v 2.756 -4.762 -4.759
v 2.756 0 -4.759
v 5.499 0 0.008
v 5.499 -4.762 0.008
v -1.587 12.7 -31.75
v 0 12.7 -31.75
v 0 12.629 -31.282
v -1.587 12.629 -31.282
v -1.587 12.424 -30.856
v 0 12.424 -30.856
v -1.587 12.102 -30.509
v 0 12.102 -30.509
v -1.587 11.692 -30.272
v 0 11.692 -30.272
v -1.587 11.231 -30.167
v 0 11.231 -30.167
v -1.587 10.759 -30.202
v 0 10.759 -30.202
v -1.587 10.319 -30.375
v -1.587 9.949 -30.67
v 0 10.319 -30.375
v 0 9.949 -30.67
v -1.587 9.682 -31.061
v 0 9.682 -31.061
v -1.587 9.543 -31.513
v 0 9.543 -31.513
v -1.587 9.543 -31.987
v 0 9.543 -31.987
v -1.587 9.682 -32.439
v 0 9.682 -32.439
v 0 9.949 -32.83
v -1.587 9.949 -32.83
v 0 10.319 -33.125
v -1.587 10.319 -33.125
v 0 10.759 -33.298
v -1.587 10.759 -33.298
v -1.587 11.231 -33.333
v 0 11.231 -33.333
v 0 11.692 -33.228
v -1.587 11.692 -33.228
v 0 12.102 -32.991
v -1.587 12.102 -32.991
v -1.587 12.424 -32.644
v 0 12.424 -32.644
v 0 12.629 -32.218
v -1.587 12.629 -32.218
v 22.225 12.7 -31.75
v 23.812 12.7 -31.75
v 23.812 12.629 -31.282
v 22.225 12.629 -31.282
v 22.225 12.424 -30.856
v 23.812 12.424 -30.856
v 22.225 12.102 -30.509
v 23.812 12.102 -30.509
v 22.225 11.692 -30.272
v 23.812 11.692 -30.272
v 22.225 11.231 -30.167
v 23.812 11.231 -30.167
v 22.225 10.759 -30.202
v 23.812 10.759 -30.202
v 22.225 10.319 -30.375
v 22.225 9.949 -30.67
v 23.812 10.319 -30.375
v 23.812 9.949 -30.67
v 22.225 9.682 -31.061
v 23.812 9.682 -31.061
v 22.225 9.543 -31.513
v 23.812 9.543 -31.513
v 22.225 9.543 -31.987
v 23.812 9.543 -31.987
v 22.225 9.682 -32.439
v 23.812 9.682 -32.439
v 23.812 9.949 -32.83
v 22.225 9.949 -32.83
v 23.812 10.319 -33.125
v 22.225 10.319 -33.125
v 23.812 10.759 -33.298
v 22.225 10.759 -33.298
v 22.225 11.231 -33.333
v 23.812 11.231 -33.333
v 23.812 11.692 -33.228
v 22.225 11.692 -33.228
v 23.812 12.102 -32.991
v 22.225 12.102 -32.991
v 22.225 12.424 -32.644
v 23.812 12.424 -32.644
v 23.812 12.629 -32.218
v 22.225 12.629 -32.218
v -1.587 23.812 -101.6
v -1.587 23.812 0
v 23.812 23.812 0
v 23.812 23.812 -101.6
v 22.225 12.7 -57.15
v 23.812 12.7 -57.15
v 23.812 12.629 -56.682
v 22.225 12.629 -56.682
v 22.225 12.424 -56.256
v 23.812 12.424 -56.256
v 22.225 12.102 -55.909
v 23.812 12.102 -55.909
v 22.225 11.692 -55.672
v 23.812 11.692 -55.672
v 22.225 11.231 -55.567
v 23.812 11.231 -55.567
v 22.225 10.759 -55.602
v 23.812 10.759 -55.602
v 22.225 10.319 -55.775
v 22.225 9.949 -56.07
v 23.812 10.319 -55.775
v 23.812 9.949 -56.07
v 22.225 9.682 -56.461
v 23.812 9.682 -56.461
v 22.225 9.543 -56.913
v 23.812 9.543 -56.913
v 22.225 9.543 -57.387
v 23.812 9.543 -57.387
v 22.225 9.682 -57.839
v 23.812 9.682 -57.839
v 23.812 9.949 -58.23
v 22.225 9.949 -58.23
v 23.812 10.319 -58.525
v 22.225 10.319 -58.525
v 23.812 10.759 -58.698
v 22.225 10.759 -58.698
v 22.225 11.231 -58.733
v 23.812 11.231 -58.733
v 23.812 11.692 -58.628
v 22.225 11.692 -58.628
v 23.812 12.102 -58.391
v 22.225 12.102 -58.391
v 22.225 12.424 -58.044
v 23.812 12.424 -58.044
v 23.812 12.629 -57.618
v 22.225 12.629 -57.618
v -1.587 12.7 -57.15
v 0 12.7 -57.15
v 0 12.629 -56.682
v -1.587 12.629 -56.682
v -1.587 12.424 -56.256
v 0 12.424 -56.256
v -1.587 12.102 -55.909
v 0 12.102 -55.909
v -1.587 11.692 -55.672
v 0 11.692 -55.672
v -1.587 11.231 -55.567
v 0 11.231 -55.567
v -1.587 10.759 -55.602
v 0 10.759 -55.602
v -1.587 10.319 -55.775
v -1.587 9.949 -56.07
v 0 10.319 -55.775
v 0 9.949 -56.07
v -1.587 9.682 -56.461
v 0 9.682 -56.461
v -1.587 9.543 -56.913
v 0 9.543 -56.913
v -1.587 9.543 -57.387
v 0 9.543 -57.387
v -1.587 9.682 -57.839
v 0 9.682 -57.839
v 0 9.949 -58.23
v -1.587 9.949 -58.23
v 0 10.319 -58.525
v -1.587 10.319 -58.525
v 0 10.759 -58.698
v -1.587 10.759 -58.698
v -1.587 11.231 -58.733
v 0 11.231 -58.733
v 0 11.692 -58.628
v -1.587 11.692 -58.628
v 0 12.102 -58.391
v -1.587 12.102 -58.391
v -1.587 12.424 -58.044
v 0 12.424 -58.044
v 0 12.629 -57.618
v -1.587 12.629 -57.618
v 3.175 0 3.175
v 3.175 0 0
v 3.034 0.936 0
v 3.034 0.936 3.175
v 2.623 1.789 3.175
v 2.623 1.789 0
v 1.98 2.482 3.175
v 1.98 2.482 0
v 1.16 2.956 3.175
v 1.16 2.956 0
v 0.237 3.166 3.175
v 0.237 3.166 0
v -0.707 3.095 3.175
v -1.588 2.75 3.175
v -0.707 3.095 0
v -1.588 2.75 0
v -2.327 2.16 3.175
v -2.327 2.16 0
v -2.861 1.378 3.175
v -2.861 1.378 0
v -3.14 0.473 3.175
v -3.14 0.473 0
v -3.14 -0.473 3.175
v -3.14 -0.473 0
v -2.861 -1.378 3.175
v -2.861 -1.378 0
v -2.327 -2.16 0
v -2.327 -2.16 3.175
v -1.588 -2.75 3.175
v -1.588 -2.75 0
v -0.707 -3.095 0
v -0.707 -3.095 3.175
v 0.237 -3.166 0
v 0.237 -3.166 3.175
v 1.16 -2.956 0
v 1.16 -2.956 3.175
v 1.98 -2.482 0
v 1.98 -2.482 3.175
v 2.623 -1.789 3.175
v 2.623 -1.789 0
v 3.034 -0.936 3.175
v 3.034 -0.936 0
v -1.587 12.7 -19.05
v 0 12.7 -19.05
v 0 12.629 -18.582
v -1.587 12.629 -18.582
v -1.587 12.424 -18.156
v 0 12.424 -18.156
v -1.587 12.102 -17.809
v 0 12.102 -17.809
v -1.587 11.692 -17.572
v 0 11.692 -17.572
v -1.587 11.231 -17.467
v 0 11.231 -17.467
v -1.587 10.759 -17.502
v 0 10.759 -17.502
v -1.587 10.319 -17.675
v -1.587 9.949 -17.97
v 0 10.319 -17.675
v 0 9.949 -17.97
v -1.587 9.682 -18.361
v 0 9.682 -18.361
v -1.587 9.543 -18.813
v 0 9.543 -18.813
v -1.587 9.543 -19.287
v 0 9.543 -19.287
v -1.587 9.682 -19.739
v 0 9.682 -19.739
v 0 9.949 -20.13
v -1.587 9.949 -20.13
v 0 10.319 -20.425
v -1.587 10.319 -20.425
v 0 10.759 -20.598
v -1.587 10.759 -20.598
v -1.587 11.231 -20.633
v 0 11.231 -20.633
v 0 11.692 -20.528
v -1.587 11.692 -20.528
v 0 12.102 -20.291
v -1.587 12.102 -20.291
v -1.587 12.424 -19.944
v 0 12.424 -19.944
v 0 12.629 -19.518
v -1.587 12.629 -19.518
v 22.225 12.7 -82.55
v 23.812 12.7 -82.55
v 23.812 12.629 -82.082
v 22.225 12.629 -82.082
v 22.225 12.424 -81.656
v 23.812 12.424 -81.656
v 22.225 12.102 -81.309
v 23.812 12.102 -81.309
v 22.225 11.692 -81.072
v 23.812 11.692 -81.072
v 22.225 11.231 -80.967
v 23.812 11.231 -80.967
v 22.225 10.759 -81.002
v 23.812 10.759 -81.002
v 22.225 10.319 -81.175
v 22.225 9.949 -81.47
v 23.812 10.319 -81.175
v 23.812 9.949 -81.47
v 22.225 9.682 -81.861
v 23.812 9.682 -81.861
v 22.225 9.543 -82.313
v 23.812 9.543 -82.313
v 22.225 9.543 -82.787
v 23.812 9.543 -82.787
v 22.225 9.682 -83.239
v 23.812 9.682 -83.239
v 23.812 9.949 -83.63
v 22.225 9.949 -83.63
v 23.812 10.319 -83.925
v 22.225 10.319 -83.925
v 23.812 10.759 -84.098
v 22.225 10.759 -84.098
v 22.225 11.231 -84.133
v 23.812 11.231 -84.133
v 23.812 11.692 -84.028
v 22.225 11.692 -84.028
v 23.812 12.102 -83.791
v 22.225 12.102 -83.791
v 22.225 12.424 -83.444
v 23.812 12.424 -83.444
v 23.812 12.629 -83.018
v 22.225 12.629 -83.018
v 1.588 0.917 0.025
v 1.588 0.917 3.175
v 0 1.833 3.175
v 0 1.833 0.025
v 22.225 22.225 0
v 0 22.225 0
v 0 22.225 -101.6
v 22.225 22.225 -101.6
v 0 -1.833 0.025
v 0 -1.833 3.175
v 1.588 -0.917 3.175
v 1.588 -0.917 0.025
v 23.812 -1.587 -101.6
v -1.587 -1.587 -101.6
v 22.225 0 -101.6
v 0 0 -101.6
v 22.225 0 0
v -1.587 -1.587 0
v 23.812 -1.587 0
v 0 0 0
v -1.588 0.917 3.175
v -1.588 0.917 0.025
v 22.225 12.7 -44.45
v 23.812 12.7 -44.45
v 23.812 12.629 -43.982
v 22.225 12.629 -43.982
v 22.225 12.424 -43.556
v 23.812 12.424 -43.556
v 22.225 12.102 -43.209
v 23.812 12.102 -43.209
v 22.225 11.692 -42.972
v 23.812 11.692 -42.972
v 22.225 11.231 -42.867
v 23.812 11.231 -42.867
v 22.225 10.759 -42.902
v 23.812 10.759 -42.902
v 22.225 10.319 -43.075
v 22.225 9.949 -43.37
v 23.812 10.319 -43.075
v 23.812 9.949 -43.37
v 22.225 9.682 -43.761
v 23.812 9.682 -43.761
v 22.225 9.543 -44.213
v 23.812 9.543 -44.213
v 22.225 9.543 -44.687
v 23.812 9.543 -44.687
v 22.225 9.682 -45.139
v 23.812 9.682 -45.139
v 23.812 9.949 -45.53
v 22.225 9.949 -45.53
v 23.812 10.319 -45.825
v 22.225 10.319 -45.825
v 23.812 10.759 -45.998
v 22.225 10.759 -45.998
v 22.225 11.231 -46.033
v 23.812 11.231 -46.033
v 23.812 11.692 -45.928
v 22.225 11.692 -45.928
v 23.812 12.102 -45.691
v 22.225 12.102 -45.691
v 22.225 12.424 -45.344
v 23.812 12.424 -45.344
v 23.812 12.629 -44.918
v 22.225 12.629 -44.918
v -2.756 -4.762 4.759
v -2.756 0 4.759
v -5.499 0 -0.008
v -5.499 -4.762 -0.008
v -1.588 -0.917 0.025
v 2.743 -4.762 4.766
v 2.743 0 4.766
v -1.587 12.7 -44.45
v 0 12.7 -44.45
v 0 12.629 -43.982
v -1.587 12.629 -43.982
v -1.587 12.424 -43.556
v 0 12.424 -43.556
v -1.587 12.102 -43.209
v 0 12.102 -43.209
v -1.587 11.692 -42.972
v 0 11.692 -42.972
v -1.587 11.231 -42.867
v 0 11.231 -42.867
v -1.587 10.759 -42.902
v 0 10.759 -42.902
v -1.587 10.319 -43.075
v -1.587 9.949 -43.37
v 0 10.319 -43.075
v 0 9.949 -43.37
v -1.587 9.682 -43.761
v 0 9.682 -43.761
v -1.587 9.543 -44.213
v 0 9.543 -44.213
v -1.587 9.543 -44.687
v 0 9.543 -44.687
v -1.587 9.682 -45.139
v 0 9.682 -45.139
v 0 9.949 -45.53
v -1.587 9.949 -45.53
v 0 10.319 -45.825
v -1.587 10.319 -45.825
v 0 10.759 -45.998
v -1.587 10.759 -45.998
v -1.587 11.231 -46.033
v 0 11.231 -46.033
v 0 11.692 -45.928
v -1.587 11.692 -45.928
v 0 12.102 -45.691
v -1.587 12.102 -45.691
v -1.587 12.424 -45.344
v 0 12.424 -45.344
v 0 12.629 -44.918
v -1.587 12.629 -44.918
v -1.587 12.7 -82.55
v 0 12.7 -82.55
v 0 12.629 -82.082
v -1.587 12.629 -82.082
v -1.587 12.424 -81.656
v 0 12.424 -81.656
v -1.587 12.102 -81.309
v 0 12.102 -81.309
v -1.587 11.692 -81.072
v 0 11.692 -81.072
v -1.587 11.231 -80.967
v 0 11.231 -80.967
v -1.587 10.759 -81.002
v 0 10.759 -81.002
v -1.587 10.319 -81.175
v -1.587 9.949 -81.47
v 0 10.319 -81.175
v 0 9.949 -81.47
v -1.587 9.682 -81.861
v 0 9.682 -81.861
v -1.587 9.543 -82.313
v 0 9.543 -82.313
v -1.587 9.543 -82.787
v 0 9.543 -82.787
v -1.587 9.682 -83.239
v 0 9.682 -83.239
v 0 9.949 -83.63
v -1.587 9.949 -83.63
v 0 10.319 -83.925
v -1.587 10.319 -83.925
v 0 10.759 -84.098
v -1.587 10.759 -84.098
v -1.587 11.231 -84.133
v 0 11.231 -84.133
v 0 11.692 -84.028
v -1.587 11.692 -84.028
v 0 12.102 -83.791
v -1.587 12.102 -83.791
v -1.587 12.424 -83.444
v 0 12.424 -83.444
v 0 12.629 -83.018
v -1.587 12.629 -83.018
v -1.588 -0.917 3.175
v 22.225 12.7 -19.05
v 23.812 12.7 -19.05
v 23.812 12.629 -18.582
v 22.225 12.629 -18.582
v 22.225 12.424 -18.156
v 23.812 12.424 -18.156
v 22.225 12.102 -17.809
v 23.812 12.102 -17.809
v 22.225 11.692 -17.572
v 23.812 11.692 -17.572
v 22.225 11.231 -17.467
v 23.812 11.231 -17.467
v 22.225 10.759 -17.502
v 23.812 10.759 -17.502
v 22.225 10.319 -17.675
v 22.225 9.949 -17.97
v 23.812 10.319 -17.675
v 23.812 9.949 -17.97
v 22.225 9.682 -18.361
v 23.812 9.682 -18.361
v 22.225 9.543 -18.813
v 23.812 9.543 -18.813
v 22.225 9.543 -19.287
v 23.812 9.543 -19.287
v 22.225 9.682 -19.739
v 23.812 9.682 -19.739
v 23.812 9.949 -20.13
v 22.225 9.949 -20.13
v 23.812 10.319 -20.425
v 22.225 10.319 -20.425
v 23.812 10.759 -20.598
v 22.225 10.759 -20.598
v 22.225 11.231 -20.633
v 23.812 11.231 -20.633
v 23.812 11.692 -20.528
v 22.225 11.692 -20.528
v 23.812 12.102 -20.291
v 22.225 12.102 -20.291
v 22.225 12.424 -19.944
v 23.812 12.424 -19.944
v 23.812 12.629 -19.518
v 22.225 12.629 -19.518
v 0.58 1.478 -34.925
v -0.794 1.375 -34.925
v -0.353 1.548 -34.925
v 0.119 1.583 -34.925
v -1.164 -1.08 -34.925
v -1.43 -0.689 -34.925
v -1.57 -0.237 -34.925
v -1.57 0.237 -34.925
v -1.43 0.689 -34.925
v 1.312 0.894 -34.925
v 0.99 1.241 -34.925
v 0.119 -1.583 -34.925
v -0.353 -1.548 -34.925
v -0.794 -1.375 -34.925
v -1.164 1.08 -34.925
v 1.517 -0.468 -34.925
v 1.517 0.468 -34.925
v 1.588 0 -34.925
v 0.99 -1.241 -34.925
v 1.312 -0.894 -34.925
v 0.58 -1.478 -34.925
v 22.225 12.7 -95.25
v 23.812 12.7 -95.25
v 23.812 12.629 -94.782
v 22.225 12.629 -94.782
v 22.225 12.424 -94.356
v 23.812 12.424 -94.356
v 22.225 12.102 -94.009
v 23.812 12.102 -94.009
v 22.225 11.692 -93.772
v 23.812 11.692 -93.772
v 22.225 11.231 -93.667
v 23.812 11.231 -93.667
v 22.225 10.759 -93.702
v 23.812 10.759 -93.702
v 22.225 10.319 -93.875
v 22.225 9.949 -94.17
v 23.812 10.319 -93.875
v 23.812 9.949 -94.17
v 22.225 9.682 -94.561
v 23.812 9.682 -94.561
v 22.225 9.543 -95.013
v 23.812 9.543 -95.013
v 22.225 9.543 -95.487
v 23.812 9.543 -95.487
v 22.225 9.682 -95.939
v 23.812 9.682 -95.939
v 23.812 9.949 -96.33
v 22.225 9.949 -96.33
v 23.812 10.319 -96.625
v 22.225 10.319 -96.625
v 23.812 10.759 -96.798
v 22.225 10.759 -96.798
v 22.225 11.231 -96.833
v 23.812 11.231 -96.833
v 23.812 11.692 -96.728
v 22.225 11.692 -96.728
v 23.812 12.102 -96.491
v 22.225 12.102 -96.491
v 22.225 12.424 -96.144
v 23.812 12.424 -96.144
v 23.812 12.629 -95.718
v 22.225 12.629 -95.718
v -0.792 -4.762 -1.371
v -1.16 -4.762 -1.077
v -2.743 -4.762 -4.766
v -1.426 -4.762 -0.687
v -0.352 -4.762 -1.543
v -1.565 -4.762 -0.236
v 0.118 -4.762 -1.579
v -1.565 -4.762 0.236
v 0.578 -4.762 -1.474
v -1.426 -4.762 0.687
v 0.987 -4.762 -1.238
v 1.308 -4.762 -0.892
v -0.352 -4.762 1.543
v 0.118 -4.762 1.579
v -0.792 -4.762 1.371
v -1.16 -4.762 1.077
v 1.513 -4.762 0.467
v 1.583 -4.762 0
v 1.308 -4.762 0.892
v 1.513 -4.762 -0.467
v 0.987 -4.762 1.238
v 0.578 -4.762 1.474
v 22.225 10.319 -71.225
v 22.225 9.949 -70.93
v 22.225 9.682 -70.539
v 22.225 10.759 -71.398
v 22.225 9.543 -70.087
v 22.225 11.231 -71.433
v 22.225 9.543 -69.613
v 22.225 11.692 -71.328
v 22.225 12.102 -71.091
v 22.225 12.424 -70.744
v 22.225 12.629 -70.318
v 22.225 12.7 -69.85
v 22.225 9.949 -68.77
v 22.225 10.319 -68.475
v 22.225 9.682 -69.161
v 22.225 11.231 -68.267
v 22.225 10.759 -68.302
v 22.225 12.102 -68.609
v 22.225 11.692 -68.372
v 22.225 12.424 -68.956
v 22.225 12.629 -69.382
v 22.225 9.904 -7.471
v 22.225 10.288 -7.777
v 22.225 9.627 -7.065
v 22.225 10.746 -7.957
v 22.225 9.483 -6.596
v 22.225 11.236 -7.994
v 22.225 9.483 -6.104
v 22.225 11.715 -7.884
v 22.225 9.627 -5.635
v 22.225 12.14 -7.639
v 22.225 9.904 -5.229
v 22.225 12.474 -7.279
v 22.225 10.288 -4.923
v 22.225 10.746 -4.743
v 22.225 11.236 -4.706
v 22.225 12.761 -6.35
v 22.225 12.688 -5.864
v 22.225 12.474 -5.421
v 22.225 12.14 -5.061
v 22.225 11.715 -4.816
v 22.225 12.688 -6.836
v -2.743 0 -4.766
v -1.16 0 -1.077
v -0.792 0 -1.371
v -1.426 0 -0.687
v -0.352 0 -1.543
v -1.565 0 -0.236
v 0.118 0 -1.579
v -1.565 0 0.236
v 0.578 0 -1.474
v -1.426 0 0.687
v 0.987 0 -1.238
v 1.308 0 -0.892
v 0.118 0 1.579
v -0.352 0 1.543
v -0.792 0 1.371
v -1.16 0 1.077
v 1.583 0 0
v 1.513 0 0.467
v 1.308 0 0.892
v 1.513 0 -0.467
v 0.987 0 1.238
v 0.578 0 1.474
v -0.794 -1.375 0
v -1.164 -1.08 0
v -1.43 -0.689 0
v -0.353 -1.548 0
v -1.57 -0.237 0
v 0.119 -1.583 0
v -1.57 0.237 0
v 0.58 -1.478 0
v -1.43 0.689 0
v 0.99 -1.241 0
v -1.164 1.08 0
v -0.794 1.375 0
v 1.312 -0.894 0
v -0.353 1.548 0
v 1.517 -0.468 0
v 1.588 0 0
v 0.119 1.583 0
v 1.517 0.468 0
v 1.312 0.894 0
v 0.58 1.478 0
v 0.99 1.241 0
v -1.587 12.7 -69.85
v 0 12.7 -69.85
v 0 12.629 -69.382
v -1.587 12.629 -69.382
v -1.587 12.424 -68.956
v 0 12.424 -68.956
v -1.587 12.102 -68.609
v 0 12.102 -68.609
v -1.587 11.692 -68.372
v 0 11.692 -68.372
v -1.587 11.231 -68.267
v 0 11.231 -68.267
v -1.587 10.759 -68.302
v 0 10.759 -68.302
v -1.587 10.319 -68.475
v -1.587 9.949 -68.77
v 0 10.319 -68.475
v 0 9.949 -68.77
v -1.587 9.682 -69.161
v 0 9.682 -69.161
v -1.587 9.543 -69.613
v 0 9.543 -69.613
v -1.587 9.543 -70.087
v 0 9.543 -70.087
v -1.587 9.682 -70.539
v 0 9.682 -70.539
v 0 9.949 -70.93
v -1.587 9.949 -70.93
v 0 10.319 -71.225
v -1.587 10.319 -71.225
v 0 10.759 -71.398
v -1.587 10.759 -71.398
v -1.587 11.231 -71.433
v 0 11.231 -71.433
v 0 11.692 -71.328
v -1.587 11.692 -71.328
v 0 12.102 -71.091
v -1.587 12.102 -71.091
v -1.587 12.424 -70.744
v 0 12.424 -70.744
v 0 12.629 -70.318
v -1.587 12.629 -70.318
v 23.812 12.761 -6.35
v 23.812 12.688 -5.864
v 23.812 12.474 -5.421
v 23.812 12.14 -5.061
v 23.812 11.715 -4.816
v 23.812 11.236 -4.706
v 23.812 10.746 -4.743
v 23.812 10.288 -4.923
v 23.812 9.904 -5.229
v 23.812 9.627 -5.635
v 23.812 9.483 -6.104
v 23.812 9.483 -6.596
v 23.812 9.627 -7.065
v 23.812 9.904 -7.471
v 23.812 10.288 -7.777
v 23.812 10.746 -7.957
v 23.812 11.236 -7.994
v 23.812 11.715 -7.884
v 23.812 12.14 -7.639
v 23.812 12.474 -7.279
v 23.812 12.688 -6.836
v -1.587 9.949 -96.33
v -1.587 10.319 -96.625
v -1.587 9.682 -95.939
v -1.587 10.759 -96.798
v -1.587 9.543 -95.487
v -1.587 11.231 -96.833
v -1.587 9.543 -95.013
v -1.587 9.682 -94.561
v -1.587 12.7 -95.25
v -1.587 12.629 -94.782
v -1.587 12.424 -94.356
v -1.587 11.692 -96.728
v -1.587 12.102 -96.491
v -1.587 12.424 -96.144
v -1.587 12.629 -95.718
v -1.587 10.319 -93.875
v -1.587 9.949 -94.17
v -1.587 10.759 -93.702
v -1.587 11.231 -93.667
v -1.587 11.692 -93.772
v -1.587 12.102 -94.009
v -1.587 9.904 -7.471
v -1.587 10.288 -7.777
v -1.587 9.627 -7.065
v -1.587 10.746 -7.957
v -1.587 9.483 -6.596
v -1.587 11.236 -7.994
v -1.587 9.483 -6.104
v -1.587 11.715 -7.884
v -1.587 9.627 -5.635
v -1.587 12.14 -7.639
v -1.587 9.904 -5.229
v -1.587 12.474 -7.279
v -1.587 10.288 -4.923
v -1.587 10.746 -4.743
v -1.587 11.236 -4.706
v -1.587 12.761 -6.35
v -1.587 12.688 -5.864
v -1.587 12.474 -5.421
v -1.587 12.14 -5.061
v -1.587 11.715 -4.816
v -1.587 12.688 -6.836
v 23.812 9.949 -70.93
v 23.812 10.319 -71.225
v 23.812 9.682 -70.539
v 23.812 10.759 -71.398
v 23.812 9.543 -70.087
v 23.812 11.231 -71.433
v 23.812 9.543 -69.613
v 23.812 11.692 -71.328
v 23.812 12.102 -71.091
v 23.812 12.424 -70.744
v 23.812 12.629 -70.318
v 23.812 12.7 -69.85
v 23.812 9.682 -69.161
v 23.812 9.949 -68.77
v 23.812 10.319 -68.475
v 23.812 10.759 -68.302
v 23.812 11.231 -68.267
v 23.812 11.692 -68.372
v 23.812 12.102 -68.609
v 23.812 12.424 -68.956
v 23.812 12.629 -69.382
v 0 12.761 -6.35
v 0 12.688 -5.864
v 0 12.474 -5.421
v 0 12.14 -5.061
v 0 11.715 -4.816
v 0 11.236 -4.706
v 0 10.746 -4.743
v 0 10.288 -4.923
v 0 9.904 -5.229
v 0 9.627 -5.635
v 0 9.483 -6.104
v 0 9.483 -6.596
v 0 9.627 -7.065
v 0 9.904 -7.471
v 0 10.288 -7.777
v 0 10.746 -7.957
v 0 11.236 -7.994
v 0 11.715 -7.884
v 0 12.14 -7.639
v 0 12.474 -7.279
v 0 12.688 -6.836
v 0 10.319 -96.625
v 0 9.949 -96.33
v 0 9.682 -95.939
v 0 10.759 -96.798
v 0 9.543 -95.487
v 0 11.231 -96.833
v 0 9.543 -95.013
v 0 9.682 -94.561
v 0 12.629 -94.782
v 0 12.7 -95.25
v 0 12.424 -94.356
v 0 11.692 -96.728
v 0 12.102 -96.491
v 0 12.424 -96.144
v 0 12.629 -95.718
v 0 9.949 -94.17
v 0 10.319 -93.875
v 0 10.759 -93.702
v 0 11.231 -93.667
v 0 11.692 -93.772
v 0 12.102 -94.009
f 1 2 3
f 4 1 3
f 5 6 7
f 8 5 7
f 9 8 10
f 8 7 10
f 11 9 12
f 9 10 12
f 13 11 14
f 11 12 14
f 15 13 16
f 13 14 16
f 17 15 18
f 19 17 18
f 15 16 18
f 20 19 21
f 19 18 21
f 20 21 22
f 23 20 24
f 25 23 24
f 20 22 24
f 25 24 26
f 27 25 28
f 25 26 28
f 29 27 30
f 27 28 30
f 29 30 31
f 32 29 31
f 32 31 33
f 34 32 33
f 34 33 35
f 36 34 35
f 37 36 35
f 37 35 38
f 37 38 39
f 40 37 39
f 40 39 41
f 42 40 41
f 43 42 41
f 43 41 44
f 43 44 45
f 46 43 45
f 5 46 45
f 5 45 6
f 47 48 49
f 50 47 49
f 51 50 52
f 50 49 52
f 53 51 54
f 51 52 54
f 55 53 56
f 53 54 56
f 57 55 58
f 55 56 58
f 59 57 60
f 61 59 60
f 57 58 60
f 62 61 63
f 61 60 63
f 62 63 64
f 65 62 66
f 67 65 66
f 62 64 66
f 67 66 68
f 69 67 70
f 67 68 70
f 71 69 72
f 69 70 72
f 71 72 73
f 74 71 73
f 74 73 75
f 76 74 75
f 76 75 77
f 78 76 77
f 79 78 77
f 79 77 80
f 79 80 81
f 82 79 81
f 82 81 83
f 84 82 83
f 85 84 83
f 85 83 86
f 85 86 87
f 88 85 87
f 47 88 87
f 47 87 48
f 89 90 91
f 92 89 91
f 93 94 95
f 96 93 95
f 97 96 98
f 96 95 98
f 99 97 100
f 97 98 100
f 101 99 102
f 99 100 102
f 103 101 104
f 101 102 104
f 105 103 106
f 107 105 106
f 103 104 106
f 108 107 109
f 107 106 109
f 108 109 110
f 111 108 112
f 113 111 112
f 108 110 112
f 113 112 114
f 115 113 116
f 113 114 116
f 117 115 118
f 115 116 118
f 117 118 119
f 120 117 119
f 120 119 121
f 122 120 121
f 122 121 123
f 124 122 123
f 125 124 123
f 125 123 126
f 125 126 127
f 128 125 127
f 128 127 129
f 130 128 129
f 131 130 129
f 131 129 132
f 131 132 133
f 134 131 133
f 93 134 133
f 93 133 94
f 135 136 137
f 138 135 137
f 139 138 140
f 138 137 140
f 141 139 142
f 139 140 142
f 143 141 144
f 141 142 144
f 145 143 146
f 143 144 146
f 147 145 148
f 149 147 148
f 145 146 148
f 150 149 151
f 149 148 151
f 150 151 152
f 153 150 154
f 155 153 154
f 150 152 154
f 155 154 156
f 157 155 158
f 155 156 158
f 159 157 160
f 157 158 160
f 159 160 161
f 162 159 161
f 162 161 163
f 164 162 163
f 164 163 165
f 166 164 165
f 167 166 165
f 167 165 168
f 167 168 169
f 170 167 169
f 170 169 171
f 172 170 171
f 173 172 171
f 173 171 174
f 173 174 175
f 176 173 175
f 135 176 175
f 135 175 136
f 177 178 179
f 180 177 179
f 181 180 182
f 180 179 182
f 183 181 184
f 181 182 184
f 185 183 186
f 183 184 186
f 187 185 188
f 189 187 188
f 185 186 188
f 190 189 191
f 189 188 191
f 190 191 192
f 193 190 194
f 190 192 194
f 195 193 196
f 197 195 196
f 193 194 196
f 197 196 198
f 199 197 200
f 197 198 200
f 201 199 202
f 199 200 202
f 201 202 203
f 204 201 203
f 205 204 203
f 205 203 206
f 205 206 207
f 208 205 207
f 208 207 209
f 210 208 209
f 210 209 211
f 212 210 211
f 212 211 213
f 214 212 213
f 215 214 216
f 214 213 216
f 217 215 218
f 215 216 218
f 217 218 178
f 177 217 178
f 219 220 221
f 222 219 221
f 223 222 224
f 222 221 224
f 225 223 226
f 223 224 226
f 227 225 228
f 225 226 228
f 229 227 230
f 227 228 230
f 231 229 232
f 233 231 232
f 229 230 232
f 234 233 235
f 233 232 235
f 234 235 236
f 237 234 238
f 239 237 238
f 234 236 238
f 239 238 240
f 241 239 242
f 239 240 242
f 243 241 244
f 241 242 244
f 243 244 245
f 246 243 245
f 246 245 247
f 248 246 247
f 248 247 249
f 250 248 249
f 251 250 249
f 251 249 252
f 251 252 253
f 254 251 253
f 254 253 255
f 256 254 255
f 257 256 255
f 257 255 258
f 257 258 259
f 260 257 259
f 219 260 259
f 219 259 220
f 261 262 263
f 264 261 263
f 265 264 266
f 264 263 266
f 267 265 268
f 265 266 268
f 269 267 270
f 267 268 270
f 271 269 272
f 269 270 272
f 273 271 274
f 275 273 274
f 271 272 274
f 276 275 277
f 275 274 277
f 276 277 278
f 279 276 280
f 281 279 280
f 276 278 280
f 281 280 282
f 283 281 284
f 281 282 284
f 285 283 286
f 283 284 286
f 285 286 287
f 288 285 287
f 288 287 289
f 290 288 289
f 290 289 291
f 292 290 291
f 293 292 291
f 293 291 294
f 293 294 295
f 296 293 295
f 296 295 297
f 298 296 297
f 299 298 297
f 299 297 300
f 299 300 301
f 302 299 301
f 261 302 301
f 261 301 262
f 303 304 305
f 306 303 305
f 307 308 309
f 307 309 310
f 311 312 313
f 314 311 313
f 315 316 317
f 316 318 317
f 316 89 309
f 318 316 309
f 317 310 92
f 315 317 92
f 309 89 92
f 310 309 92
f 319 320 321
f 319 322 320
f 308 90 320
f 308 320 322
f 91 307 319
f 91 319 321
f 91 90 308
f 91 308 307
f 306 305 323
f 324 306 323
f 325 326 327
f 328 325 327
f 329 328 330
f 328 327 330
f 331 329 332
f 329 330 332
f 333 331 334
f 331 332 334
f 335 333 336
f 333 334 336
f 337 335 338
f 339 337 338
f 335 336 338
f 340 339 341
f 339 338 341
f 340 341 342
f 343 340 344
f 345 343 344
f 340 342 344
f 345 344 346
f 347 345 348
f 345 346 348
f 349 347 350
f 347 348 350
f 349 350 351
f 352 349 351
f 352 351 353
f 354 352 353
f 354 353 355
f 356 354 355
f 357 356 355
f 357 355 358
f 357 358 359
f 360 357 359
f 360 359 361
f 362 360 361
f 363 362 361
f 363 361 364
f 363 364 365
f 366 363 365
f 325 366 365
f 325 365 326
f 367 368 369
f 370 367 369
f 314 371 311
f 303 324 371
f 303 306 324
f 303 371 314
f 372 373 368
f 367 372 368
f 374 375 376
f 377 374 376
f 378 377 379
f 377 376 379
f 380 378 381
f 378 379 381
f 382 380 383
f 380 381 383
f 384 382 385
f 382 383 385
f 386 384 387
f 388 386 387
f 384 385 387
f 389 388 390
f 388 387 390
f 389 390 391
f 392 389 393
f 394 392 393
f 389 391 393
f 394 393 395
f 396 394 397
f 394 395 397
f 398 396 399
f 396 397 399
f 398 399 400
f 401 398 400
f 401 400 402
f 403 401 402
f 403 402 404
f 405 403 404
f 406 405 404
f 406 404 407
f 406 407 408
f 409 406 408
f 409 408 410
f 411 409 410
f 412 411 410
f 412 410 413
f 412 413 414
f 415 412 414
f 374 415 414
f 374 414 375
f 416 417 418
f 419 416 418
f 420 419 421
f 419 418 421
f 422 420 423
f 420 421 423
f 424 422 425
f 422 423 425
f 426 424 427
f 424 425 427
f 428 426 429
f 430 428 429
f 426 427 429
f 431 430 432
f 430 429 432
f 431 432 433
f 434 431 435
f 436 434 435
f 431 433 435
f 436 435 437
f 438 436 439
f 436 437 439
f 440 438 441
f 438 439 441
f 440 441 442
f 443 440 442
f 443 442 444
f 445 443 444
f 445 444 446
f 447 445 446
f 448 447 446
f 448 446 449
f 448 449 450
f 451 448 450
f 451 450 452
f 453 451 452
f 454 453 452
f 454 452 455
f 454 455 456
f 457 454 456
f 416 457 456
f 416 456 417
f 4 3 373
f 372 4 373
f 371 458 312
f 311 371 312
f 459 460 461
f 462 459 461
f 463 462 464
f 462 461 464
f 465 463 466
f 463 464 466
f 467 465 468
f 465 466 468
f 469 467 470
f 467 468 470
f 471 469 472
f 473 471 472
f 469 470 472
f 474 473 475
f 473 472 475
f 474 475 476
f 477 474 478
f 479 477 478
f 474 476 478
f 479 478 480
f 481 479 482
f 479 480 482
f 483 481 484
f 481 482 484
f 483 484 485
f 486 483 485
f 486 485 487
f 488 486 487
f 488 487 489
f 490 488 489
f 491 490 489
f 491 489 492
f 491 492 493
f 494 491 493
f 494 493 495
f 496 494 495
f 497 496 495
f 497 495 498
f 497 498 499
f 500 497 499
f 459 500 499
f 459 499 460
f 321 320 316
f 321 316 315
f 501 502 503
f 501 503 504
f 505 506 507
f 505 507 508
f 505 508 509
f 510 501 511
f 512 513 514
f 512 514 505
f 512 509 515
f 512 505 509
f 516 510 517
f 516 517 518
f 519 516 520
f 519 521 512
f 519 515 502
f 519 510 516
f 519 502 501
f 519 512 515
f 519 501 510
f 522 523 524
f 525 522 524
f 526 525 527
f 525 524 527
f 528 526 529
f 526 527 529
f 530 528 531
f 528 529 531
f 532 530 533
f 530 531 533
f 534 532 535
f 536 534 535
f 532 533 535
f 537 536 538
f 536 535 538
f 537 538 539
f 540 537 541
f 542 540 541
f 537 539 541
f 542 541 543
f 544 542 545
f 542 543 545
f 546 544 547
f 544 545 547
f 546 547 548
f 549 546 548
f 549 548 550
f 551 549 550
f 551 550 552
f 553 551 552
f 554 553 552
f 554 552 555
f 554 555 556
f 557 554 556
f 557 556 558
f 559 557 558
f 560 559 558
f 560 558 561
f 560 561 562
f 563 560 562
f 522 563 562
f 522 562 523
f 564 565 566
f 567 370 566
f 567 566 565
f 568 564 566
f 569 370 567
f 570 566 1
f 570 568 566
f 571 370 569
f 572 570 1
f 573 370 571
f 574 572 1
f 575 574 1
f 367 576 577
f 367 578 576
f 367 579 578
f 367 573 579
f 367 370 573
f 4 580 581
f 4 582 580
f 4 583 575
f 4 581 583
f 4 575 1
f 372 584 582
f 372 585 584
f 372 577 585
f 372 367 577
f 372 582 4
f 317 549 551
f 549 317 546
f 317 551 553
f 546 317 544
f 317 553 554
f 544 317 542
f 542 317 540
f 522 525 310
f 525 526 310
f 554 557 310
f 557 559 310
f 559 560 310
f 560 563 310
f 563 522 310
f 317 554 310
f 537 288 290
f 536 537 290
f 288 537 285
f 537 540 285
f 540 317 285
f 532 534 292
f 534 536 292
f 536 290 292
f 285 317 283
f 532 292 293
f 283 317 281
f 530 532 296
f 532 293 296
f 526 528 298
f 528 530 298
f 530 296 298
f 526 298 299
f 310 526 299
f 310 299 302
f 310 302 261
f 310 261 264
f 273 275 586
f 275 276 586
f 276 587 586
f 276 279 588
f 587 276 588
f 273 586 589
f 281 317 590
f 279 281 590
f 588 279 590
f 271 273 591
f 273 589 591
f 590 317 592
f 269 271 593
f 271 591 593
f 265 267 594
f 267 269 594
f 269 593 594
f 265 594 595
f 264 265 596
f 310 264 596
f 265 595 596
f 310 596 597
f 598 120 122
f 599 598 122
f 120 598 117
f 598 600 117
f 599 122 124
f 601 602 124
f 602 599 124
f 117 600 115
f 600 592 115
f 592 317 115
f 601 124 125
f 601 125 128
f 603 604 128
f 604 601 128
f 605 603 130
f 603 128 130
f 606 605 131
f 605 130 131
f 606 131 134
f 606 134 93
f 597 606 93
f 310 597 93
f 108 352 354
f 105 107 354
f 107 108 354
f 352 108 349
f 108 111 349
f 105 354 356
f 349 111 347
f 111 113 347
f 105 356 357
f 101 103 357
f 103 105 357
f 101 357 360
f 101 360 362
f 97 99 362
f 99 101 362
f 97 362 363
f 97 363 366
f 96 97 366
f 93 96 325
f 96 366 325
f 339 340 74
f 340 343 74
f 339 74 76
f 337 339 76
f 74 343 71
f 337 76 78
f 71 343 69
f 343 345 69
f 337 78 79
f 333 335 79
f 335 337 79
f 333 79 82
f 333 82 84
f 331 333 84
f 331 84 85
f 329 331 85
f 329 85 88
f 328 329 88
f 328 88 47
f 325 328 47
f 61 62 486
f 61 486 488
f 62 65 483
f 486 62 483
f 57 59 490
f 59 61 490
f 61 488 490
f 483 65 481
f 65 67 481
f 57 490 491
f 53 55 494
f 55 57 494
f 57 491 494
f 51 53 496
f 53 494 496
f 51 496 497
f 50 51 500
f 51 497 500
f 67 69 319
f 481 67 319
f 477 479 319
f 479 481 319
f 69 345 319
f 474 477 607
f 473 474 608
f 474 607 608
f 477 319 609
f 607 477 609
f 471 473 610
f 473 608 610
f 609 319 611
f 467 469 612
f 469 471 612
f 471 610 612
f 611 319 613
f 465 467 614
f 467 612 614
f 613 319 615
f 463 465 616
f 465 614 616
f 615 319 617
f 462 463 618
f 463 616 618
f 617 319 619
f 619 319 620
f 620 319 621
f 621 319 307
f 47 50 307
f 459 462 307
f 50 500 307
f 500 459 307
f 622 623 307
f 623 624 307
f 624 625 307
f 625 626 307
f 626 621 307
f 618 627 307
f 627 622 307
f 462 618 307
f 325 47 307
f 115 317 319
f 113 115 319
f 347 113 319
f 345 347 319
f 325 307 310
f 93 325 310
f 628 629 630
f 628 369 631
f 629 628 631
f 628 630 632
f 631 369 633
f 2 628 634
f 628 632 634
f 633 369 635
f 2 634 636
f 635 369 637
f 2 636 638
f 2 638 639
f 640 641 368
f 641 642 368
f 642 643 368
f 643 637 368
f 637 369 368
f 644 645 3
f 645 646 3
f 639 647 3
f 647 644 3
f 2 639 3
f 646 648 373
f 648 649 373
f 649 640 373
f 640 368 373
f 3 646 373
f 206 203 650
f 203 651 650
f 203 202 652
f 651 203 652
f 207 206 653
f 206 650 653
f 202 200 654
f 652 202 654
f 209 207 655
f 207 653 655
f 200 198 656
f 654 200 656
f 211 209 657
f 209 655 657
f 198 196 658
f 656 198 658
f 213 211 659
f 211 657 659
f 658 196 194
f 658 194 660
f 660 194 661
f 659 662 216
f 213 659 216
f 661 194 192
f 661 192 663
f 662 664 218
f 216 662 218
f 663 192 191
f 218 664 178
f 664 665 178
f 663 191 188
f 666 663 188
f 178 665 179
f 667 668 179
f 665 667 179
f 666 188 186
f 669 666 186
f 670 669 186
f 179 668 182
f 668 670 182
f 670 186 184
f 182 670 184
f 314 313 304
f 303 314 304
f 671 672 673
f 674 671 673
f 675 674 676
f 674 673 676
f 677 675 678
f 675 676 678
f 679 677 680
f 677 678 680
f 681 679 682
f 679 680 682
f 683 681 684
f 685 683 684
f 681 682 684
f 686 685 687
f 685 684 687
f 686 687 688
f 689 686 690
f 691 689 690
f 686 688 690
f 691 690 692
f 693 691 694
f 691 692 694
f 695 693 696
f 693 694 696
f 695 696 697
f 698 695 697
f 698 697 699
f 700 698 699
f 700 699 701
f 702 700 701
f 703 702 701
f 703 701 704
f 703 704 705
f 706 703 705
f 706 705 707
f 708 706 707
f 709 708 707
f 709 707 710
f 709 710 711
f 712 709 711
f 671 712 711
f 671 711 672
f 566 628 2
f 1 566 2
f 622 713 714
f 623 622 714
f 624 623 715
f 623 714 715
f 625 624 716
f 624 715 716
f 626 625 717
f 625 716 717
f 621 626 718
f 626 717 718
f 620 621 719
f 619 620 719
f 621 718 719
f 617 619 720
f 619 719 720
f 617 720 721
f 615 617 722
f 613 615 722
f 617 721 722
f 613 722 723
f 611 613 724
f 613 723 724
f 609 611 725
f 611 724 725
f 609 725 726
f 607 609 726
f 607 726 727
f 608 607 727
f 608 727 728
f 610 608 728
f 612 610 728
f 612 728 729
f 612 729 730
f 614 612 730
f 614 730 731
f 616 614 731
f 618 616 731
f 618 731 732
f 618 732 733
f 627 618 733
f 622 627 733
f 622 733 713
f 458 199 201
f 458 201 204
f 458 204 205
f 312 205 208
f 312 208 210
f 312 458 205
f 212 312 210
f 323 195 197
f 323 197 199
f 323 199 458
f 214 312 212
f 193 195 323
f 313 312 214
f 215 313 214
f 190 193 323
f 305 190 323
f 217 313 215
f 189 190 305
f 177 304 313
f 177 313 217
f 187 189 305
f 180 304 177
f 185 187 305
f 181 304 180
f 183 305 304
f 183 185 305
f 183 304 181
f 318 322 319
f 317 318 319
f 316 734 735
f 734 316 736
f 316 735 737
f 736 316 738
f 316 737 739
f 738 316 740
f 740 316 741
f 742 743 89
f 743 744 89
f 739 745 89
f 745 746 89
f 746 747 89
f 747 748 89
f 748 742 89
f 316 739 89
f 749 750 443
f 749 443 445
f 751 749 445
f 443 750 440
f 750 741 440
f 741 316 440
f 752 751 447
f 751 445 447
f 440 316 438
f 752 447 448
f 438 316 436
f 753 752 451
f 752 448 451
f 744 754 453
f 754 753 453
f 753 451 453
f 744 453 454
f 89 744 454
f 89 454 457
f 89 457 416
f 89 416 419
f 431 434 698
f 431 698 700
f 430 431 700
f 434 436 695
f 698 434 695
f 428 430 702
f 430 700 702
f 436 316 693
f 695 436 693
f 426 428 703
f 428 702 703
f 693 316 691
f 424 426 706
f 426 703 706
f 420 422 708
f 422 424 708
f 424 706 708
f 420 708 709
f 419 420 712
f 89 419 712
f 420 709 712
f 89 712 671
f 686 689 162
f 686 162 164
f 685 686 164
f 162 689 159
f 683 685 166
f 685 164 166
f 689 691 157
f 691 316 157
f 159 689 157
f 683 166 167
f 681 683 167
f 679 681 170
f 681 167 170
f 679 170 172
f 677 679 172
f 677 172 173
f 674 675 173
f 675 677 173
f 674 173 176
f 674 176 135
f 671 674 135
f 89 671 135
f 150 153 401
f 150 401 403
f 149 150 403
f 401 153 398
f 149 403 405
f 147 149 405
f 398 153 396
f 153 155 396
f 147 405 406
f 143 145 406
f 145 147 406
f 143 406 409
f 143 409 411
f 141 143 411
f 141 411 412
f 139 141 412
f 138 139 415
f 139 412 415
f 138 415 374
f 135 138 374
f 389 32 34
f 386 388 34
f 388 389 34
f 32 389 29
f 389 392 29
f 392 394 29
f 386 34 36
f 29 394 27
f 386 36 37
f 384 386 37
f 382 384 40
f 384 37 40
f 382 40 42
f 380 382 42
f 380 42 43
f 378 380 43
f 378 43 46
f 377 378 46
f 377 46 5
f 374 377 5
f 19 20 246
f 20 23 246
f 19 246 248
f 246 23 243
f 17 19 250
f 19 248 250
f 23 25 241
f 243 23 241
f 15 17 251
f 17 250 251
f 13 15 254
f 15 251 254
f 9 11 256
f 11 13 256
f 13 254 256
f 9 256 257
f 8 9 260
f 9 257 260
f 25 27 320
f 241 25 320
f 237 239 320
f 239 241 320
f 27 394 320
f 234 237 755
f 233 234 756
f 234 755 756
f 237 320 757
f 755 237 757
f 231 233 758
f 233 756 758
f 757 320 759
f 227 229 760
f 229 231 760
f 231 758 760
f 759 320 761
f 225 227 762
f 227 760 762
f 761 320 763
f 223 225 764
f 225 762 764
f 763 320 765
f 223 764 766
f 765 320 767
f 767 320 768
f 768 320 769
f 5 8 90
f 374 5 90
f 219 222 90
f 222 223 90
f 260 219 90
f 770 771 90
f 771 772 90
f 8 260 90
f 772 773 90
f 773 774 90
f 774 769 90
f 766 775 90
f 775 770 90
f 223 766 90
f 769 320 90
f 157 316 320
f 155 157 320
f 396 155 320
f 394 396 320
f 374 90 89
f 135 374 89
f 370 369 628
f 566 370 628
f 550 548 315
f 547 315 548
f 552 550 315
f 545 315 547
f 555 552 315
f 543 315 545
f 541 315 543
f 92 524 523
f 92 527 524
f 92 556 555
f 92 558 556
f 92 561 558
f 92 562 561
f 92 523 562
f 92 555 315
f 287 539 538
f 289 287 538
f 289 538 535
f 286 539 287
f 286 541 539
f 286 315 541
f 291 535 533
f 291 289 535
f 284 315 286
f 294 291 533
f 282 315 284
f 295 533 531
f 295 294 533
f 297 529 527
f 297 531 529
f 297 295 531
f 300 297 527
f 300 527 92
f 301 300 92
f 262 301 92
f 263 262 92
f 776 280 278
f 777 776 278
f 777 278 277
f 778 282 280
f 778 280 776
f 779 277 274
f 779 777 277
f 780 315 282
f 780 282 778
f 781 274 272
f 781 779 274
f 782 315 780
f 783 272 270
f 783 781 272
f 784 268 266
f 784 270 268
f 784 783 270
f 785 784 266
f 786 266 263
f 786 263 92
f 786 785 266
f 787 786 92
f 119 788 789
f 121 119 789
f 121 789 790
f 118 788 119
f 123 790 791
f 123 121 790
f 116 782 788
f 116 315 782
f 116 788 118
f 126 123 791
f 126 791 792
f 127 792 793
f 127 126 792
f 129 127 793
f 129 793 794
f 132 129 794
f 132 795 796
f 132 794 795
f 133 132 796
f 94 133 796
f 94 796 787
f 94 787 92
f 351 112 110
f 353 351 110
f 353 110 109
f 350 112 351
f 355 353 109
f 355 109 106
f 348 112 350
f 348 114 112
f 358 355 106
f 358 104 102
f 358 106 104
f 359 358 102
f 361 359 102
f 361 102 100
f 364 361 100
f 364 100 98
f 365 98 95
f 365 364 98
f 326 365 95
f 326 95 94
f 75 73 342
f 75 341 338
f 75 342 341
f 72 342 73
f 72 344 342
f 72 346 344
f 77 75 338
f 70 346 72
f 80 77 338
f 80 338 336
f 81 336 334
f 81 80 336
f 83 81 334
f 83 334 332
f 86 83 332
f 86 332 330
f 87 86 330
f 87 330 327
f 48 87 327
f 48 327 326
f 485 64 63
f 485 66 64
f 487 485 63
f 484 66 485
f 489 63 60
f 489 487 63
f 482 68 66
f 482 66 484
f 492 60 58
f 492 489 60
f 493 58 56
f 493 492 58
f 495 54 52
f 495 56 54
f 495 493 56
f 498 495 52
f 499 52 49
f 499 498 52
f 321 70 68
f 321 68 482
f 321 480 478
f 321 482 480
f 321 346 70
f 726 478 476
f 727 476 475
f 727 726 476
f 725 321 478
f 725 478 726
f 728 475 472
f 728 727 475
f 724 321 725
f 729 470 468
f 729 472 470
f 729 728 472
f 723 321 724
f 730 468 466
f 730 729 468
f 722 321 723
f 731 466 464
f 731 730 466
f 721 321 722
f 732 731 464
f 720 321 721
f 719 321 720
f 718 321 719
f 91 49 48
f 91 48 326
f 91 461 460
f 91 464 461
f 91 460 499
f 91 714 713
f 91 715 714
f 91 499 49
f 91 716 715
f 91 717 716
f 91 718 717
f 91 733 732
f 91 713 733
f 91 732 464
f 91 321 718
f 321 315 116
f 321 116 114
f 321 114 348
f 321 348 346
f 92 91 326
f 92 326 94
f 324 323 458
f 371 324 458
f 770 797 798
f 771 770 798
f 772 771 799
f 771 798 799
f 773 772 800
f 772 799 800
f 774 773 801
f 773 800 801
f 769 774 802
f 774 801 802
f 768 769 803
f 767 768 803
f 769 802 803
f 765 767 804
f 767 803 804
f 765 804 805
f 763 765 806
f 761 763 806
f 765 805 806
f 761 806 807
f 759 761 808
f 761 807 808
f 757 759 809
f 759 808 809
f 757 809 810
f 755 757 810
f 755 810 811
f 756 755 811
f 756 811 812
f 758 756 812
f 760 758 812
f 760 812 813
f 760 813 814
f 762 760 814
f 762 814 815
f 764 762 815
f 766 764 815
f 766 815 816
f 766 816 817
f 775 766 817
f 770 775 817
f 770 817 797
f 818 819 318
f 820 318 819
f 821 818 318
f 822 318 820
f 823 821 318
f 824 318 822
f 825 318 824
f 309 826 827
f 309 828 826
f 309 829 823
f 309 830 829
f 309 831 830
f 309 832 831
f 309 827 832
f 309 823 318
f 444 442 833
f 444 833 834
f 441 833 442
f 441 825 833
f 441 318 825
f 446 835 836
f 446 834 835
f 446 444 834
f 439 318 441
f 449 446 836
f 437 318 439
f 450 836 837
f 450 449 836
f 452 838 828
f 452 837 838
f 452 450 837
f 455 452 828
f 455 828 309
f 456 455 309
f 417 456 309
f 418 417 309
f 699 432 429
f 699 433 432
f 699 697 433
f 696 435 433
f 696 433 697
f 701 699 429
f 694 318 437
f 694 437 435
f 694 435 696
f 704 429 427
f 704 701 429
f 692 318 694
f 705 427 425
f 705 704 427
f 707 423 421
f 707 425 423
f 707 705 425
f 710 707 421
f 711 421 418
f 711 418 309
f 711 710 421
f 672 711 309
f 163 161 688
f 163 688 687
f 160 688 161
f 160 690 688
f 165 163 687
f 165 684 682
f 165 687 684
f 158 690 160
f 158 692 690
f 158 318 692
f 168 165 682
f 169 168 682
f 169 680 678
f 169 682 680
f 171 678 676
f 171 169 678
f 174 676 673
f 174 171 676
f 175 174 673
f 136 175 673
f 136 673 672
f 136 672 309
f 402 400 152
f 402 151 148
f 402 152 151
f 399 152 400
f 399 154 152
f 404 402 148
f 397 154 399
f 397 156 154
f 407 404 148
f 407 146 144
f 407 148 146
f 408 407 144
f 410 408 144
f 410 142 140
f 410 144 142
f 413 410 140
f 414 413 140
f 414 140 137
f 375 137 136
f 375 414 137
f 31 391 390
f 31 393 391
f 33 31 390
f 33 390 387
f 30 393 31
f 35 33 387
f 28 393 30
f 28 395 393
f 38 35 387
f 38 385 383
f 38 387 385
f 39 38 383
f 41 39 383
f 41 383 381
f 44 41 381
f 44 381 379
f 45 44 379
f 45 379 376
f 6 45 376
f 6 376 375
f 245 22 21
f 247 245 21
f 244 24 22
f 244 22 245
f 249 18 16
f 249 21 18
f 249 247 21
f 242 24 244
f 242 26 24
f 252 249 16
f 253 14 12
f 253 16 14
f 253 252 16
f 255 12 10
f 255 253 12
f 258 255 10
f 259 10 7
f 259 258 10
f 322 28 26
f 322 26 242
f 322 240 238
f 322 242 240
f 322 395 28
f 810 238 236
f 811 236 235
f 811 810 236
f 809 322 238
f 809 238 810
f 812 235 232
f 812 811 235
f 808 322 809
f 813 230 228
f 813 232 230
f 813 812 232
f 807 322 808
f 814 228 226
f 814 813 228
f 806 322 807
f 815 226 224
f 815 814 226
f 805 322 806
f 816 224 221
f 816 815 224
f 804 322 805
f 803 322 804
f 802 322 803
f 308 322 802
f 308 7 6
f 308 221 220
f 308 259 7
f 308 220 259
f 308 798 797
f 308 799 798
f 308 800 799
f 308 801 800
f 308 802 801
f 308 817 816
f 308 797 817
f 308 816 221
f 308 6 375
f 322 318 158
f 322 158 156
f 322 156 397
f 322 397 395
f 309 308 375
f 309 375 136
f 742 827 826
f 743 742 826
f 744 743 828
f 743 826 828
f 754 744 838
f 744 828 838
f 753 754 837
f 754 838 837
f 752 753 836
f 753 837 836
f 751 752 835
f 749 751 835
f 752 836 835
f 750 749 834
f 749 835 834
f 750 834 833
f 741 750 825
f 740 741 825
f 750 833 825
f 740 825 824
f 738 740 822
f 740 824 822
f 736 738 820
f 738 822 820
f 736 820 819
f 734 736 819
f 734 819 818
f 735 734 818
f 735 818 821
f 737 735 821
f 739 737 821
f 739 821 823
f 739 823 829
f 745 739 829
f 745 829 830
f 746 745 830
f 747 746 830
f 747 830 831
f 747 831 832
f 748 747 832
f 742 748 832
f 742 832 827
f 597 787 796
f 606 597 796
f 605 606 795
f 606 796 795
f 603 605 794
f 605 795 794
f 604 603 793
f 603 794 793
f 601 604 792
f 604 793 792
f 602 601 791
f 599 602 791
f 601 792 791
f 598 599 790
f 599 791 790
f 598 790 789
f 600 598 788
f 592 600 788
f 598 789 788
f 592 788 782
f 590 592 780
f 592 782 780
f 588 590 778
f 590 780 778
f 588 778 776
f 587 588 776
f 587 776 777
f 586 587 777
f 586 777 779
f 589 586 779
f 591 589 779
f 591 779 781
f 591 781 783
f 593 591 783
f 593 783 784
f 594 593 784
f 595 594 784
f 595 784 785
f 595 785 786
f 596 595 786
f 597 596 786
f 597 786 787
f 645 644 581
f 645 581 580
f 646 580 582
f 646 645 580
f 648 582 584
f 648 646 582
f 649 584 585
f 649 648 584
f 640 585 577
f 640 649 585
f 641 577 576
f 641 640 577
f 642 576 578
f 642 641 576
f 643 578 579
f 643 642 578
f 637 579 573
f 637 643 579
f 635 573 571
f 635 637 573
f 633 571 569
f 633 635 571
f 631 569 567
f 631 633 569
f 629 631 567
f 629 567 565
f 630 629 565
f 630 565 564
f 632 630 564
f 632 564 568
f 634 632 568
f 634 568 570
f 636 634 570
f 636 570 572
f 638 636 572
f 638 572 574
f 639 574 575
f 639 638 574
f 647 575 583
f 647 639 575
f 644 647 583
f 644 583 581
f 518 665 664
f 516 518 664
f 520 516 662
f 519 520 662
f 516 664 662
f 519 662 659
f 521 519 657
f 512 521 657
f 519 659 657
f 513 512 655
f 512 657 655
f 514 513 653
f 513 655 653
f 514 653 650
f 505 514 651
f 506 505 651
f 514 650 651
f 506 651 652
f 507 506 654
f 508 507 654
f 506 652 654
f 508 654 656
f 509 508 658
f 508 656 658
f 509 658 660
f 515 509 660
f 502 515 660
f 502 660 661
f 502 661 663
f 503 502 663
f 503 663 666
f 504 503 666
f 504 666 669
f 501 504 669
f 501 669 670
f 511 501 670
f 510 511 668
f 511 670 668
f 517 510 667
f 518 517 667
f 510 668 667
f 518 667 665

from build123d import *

# Parameters (mm, degrees)
F2_DEPTH  = 4.7625
F1_R      = 1.58301057
F3_DEPTH  = 4.7625
F4_R      = 3.175
F5_DEPTH  = 3.175
F6_R      = 1.5875
F7_DEPTH  = 34.925
F9_DEPTH  = 3.1496
F11_W     = 25.4
F11_H     = 25.4
F12_DEPTH = 101.6
F10_W     = 22.225
F10_H     = 22.225
F13_DEPTH = 101.6
F14_R     = 1.6482662837
F22_DEPTH = 25.4
F15_R     = 1.5875
F23_DEPTH = 25.4
F21_R     = 1.5875
F24_DEPTH = 25.4
F20_R     = 1.5875
F25_DEPTH = 25.4
F19_R     = 1.5875
F26_DEPTH = 25.4
F18_R     = 1.5875
F27_DEPTH = 25.4
F17_R     = 1.5875
F28_DEPTH = 25.4
F16_R     = 1.5875
F29_DEPTH = 25.4


with BuildPart() as f2:
    # F0 (on Front) → F2 (new body)
    with BuildSketch(Plane.XZ):
        Polygon((2.7564916063, -4.7585388291), (5.499261314, 0.0079223418), (2.7427697078, 4.7664611709), (-2.7564916063, 4.7585388291), (-5.499261314, -0.0079223418), (-2.7427697078, -4.7664611709), align=None)
    extrude(amount=F2_DEPTH)

    # F1 (on face) → F3 (cut)
    with BuildSketch(Plane.XZ):
        Circle(F1_R)
    extrude(amount=F3_DEPTH, mode=Mode.SUBTRACT)


with BuildPart() as f5:
    # F4 (on Top) → F5 (new body)
    with BuildSketch(Plane.XY):
        Circle(F4_R)
    extrude(amount=F5_DEPTH)

    # F6 (on face) → F7 (join)
    with BuildSketch(Plane(origin=(0, 0, 0), x_dir=(1, 0, 0), z_dir=(0, 0, -1))):
        Circle(F6_R)
    extrude(amount=F7_DEPTH)

    # F8 (on face) → F9 (cut)
    with BuildSketch(Plane.XY.offset(3.175)):
        Polygon((-1.5875, 0.9165435523), (-1.5875, -0.9165435523), (0, -1.8330871047), (1.5875, -0.9165435523), (1.5875, 0.9165435523), (0, 1.8330871047), align=None)
    extrude(amount=-F9_DEPTH, mode=Mode.SUBTRACT)


with BuildPart() as f12:
    # F11 (on Top) → F12 (new body)
    with BuildSketch(Plane.XY):
        with Locations((11.1125, 11.1125)):
            Rectangle(F11_W, F11_H)
    extrude(amount=-F12_DEPTH)

    # F10 (on Top) → F13 (cut)
    with BuildSketch(Plane.XY):
        with Locations((11.1125, 11.1125)):
            Rectangle(F10_W, F10_H)
    extrude(amount=-F13_DEPTH, mode=Mode.SUBTRACT)

    # F14 (on face) → F22 (cut)
    with BuildSketch(Plane.YZ.offset(23.8125)):
        with Locations((11.1125, -6.35)):
            Circle(F14_R)
    extrude(amount=-F22_DEPTH, mode=Mode.SUBTRACT)

    # F15 (on face) → F23 (cut)
    with BuildSketch(Plane.YZ.offset(23.8125)):
        with Locations((11.1125, -19.05)):
            Circle(F15_R)
    extrude(amount=-F23_DEPTH, mode=Mode.SUBTRACT)

    # F21 (on face) → F24 (cut)
    with BuildSketch(Plane.YZ.offset(23.8125)):
        with Locations((11.1125, -95.25)):
            Circle(F21_R)
    extrude(amount=-F24_DEPTH, mode=Mode.SUBTRACT)

    # F20 (on face) → F25 (cut)
    with BuildSketch(Plane.YZ.offset(23.8125)):
        with Locations((11.1125, -82.55)):
            Circle(F20_R)
    extrude(amount=-F25_DEPTH, mode=Mode.SUBTRACT)

    # F19 (on face) → F26 (cut)
    with BuildSketch(Plane.YZ.offset(23.8125)):
        with Locations((11.1125, -69.85)):
            Circle(F19_R)
    extrude(amount=-F26_DEPTH, mode=Mode.SUBTRACT)

    # F18 (on face) → F27 (cut)
    with BuildSketch(Plane.YZ.offset(23.8125)):
        with Locations((11.1125, -57.15)):
            Circle(F18_R)
    extrude(amount=-F27_DEPTH, mode=Mode.SUBTRACT)

    # F17 (on face) → F28 (cut)
    with BuildSketch(Plane.YZ.offset(23.8125)):
        with Locations((11.1125, -44.45)):
            Circle(F17_R)
    extrude(amount=-F28_DEPTH, mode=Mode.SUBTRACT)

    # F16 (on face) → F29 (cut)
    with BuildSketch(Plane.YZ.offset(23.8125)):
        with Locations((11.1125, -31.75)):
            Circle(F16_R)
    extrude(amount=-F29_DEPTH, mode=Mode.SUBTRACT)


solid = Compound([f2.part, f5.part, f12.part])
